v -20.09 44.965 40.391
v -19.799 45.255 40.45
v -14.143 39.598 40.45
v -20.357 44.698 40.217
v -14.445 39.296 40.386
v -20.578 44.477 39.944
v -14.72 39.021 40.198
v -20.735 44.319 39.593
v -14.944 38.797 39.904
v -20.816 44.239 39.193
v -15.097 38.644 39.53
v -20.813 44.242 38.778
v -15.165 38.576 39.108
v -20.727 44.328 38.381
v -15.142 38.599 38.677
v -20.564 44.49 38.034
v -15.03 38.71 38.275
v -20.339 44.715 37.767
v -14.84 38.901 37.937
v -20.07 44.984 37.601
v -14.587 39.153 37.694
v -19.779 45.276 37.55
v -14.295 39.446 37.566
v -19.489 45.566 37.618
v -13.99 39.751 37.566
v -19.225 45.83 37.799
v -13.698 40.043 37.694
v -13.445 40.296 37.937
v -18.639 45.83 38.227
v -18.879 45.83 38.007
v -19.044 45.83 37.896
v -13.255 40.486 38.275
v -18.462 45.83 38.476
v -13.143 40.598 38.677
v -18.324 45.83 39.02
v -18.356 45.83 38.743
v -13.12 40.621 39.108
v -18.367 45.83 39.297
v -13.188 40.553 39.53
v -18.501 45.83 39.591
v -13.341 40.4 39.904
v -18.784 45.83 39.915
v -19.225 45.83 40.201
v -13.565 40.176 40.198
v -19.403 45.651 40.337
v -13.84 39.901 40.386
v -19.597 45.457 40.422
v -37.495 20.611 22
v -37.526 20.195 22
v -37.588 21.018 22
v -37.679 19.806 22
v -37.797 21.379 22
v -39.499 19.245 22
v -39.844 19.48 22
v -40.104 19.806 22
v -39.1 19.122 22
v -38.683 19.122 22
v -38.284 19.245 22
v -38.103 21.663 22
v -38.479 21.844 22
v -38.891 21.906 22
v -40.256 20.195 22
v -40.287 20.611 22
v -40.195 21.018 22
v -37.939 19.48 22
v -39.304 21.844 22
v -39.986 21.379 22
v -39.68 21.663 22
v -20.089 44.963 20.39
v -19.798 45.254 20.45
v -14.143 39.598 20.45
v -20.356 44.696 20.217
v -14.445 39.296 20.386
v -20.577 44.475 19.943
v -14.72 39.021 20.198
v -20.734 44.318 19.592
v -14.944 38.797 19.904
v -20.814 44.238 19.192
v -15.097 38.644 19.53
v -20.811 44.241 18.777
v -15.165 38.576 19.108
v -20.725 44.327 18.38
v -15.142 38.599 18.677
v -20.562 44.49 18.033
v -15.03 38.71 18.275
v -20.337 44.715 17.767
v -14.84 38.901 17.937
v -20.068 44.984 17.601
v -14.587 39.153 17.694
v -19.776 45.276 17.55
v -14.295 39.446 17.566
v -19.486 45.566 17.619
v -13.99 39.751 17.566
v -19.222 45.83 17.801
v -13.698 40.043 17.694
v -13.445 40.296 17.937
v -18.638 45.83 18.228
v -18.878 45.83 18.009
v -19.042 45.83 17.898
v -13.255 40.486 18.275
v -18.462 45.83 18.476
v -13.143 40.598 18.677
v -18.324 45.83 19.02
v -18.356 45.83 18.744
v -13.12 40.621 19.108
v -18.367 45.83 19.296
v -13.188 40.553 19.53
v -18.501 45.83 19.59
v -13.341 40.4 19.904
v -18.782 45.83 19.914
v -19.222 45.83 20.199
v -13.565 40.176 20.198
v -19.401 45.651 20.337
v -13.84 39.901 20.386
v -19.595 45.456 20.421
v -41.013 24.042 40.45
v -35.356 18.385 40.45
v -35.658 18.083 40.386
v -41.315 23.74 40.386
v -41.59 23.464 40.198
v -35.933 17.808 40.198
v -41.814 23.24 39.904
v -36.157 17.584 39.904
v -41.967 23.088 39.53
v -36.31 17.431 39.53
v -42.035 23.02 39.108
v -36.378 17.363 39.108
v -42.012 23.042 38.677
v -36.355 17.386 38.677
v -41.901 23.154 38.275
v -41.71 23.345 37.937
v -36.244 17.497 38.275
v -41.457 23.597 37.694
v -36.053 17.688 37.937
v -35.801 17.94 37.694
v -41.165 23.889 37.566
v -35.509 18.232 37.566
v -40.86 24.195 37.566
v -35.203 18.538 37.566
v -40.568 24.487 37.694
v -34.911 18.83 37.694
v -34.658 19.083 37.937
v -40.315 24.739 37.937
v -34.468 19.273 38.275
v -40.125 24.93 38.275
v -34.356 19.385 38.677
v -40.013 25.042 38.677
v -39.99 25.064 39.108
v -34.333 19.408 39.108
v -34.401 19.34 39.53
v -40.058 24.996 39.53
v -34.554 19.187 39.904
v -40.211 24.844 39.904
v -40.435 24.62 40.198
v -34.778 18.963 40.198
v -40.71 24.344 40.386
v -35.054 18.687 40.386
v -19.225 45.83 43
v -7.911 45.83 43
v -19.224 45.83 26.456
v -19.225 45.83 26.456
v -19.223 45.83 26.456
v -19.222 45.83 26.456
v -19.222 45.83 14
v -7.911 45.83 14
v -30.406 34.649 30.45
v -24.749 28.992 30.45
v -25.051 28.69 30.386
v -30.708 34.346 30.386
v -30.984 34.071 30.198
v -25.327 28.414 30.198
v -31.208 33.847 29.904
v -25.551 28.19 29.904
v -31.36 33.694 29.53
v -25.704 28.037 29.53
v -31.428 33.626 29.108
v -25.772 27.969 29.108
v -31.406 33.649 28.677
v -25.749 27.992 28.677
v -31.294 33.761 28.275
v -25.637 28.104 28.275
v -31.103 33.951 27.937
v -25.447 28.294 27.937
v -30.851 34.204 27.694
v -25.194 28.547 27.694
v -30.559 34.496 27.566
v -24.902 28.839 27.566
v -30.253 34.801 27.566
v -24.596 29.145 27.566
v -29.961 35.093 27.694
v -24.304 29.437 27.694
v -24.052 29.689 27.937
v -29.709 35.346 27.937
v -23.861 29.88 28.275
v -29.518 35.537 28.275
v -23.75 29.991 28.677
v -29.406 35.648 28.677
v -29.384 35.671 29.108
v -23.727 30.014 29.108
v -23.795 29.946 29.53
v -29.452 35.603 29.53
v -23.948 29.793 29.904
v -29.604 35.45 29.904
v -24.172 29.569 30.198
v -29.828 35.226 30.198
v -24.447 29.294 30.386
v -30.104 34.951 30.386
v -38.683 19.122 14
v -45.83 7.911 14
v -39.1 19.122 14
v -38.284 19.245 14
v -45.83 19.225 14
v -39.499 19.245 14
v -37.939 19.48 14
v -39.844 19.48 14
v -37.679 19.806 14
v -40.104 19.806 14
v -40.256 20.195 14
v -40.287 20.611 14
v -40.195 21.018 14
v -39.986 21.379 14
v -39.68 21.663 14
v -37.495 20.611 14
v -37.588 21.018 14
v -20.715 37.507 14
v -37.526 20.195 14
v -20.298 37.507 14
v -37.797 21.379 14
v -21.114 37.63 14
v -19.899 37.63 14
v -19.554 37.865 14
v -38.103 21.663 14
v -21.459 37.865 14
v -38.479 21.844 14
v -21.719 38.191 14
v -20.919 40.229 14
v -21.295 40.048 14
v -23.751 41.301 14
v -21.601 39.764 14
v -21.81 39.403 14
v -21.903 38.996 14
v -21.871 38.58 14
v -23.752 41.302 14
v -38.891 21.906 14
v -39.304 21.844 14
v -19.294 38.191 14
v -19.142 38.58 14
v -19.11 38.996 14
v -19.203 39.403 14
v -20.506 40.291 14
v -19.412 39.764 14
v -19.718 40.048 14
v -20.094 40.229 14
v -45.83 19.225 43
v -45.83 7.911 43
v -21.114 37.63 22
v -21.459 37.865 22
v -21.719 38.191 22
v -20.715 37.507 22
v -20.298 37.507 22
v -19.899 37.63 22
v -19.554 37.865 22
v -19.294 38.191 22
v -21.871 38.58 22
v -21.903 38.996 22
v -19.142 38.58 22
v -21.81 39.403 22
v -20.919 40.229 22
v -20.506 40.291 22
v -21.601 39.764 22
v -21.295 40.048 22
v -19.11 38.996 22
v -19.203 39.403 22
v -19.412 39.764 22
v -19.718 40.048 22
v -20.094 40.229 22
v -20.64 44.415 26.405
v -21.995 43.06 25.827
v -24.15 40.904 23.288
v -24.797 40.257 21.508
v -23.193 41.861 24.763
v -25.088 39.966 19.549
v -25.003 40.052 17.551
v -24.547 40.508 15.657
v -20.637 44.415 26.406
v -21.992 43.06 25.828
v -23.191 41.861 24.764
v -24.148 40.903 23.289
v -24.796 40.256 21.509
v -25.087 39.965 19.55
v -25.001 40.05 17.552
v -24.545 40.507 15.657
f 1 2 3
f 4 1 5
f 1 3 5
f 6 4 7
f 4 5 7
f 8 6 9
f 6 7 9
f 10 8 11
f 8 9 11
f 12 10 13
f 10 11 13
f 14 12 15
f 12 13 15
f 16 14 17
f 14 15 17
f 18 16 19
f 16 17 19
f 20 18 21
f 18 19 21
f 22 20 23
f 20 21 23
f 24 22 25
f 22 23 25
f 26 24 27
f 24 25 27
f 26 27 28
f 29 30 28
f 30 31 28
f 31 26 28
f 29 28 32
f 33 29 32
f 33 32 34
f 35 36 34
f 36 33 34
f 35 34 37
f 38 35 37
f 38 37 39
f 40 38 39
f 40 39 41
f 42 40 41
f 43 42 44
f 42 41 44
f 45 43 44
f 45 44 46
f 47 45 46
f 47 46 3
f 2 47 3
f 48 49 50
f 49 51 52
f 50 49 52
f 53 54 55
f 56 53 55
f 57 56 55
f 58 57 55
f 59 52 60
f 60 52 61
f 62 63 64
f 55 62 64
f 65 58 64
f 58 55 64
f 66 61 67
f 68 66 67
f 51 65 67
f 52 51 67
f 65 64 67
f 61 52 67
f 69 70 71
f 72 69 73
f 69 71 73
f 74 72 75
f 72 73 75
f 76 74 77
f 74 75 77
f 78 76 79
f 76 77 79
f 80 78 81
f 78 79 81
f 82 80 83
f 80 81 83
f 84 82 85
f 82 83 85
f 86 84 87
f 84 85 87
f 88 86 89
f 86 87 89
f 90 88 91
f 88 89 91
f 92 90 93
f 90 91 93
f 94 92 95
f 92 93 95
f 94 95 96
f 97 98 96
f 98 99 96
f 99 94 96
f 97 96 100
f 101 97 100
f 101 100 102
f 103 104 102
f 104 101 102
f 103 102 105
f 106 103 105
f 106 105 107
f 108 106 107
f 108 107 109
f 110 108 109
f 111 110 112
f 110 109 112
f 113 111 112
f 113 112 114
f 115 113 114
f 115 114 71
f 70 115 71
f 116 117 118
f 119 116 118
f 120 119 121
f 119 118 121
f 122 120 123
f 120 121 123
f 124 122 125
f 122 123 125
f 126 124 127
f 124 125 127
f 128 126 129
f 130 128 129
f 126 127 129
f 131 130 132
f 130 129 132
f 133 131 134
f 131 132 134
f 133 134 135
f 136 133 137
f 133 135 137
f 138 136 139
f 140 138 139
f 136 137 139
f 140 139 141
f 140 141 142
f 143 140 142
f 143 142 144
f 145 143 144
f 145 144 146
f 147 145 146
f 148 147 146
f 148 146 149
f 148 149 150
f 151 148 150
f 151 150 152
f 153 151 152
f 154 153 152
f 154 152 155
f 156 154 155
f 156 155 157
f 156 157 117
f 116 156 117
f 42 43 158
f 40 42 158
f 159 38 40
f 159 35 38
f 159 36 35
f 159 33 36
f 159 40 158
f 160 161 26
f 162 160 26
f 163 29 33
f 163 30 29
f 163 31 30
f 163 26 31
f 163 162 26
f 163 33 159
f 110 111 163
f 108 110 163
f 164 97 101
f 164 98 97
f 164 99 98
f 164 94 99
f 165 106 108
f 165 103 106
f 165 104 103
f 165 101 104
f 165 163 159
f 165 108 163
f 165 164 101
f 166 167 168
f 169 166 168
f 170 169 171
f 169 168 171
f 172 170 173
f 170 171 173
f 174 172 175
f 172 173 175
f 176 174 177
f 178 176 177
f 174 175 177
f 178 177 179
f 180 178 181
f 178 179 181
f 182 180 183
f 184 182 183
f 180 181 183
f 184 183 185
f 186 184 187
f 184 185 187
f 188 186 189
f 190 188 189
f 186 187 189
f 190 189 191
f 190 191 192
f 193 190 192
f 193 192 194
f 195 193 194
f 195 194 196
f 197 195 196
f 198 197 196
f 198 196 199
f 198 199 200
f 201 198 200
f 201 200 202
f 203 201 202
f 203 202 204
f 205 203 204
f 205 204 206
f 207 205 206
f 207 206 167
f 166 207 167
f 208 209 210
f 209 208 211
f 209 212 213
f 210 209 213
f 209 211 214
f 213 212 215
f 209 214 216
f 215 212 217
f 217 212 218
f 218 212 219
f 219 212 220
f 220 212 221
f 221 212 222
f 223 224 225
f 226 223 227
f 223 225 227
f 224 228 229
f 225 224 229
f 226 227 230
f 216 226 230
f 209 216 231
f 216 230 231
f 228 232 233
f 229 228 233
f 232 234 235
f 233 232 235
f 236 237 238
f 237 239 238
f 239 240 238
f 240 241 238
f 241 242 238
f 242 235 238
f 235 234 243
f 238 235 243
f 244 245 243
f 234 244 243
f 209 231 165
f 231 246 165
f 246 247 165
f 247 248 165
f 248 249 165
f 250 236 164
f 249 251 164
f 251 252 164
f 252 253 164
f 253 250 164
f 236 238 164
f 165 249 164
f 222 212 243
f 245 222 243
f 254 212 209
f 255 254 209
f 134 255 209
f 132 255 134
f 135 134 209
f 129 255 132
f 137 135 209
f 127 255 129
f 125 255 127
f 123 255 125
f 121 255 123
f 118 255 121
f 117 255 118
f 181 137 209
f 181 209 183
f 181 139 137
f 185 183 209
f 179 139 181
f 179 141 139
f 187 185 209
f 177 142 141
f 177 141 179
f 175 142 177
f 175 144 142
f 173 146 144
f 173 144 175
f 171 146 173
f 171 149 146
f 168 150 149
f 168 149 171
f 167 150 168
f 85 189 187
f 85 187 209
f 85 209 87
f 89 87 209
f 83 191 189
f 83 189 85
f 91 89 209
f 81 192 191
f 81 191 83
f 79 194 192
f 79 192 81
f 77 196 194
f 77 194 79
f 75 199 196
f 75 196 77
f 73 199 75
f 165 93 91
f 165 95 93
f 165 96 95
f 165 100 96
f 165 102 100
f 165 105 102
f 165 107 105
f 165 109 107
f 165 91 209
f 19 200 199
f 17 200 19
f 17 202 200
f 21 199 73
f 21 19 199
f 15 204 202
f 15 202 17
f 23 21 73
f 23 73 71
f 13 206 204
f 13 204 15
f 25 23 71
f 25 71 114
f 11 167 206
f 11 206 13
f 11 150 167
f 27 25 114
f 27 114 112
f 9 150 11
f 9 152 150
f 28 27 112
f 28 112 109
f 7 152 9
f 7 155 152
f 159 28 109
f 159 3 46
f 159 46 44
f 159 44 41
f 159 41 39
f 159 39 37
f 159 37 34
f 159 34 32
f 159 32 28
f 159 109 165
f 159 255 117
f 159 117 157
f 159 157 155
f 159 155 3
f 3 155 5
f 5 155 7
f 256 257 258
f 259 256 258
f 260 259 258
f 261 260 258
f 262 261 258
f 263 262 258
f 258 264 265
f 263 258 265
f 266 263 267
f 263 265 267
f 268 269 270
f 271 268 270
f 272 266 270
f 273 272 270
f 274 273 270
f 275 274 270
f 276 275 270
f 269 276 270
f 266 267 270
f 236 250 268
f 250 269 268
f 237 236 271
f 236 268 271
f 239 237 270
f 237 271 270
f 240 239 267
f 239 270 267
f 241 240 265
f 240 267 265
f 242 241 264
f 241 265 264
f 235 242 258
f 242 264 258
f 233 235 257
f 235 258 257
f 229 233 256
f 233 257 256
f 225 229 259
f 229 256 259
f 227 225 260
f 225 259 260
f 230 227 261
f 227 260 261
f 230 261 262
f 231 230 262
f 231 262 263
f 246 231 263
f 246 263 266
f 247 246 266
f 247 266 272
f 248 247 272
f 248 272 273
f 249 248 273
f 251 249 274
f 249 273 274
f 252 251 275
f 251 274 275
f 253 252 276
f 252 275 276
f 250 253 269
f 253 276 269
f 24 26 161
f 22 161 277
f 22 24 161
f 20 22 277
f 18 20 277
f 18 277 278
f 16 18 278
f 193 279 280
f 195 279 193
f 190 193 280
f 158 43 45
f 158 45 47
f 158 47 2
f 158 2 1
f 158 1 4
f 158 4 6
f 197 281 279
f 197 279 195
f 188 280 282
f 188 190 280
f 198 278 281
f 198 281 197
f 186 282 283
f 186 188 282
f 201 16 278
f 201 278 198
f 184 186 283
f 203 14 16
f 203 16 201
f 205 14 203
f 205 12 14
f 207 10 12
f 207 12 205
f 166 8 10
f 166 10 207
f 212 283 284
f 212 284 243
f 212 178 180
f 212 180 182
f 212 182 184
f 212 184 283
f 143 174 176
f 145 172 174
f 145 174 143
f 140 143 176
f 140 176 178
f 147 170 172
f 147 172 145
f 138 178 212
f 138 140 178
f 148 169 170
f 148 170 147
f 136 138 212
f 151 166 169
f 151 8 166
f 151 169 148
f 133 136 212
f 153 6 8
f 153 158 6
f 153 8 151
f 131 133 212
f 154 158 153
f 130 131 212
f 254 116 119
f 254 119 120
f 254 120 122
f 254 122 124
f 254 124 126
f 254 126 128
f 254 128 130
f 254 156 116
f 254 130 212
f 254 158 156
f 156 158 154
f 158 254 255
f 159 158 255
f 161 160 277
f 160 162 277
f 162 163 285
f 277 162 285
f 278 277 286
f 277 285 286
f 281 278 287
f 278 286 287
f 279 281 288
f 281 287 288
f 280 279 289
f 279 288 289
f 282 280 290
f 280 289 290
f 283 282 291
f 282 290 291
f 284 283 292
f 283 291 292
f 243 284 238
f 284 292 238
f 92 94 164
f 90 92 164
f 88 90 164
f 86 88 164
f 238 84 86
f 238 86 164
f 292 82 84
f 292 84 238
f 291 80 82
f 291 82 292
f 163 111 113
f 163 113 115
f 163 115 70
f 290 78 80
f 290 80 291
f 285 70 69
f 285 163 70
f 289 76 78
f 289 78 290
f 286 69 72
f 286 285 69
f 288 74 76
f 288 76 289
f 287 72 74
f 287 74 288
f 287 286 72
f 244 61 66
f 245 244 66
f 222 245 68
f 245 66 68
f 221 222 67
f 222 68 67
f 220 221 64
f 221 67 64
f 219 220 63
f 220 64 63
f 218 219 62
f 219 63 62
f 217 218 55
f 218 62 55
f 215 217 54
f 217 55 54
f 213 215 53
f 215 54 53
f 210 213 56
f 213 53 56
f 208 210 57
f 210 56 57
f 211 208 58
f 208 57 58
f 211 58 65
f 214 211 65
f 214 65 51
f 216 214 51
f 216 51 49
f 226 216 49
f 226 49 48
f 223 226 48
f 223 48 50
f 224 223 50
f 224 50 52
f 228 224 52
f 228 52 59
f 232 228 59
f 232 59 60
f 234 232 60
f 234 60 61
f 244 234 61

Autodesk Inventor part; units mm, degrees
ref_plane "YZ Plane" through (0, 0, 0) normal (1, 0, 0) x (0, 1, 0)
ref_plane "XZ Plane" through (0, 0, 0) normal (0, 1, 0) x (-1, 0, 0)
ref_plane "Work Plane1" through (0, 0, 10) normal (0, 0, 1) x (1, 0, 0)
sketch "Sketch1" plane through (0, 0, 10) normal (0, 0, 1) x (1, 0, 0)
  line L0 (-4.0299, -0.3538) -> (-2.2322, 1.4439) construction
  arc A0 (-1.4439, 2.2322) -> (-2.2322, 1.4439) centre (-0.9299, 0.9299) ccw construction
  line L1 (-1.4439, 2.2322) -> (0.3538, 4.0299) construction
  line L2 (-37.8299, 42.8299) -> (-37.8299, 37.8299) construction
  line L3 (-37.8299, 37.8299) -> (-42.9208, 37.8299) construction
  line L4 (-37.8299, 42.2137) -> (-37.8299, 45.8299) construction
  line L5 (-37.8299, 45.8299) -> (-4.0299, 45.8299) construction
  line L6 (-4.0299, 45.8299) -> (-4.0299, 42.2137) construction
  line L7 (-4.0299, 4.0299) -> (0.3538, 4.0299) projected
  circle A1 centre (-20.9299, 20.9299) radius 17.5 projected
  line L8 (-20.9299, 58.9723) -> (17.1124, 20.9299) construction
  line L9 (17.1124, 20.9299) -> (-20.9299, -17.1124) construction
  line L10 (-20.9299, -17.1124) -> (-58.9723, 20.9299) construction
  line L11 (-58.9723, 20.9299) -> (-20.9299, 58.9723) construction
  line L12 (-20.9299, 58.9723) -> (-20.9299, -17.1124) construction
  line L13 (17.1124, 20.9299) -> (-58.9723, 20.9299) construction
  line L14 (-20.9299, 58.9723) -> (32.8701, 58.9723) construction
  line L15 (-43.4299, 43.4299) -> (1.5701, 43.4299) construction
  line L16 (1.5701, 43.4299) -> (1.5701, -1.5701) construction
  line L17 (1.5701, -1.5701) -> (-43.4299, -1.5701) construction
  line L18 (-43.4299, -1.5701) -> (-43.4299, 43.4299) construction
  line L19 (-43.4299, 43.4299) -> (1.5701, -1.5701) construction
  line L20 (1.5701, 43.4299) -> (-43.4299, -1.5701) construction
  line L21 (-43.4299, 5.3876) -> (-43.4299, 36.4723)
  line L22 (-43.4299, 36.4723) -> (-36.4723, 43.4299)
  line L23 (-36.4723, 43.4299) -> (-5.3876, 43.4299)
  line L24 (-5.3876, 43.4299) -> (1.5701, 36.4723)
  line L25 (1.5701, 36.4723) -> (1.5701, 5.3876)
  line L26 (1.5701, 5.3876) -> (-5.3876, -1.5701)
  line L27 (-5.3876, -1.5701) -> (-36.4723, -1.5701)
  line L28 (-36.4723, -1.5701) -> (-43.4299, 5.3876)
  line L29 (-4.0299, 42.2137) -> (-37.8299, 42.2137) projected
  line L30 (-4.0299, -0.3538) -> (-4.0299, 4.0299) projected
  circle A2 centre (-20.9299, 20.9299) radius 1.4
  line L31 (-10.9299, 10.9299) -> (-30.9299, 10.9299) construction
  line L32 (-30.9299, 10.9299) -> (-30.9299, 30.9299) construction
  line L33 (-30.9299, 30.9299) -> (-10.9299, 30.9299) construction
  line L34 (-10.9299, 30.9299) -> (-10.9299, 10.9299) construction
  line L35 (-10.9299, 10.9299) -> (-30.9299, 30.9299) construction
  line L36 (-30.9299, 10.9299) -> (-10.9299, 30.9299) construction
  circle A3 centre (-30.9299, 30.9299) radius 1.4
  circle A4 centre (-30.9299, 10.9299) radius 1.4
  circle A5 centre (-10.9299, 10.9299) radius 1.4
  line L37 (-45.8299, 37.8299) -> (-42.0723, 37.8299) construction
  line L38 (-42.1723, 37.7299) -> (-45.8299, 37.7299)
  line L39 (-45.8299, 37.7299) -> (-45.8299, 4.1299)
  line L40 (-45.8299, 4.1299) -> (-42.1723, 4.1299)
  line L41 (-42.1723, 4.1299) -> (-42.1723, 37.7299)
  line L42 (-45.8299, 4.0299) -> (-42.0723, 4.0299) construction
  line L43 (-45.8299, 37.8299) -> (-42.0723, 37.8299) projected
  line L44 (-37.7299, 45.8299) -> (-4.1299, 45.8299)
  line L45 (-4.1299, 45.8299) -> (-4.1299, 42.1723)
  line L46 (-4.1299, 42.1723) -> (-37.7299, 42.1723)
  line L47 (-37.7299, 42.1723) -> (-37.7299, 45.8299)
  line L48 (0.4701, 37.8299) -> (0.4701, 4.0299) construction
  line L49 (0.4701, 4.0299) -> (3.9701, 4.0299) construction
  line L50 (3.9701, 37.8299) -> (3.9701, 4.0299) construction
  line L51 (0.4701, 37.8299) -> (3.9701, 37.8299) construction
  line L52 (-45.8299, -3.9701) -> (-4.0299, -3.9701) construction
  line L53 (0.3124, 37.7299) -> (3.9701, 37.7299)
  line L54 (3.9701, 37.7299) -> (3.9701, 4.1299)
  line L55 (3.9701, 4.1299) -> (0.3124, 4.1299)
  line L56 (0.3124, 4.1299) -> (0.3124, 37.7299)
  line L57 (-4.1713, -0.3538) -> (-37.7299, -0.3538)
  line L58 (-37.7299, -0.3538) -> (-37.7299, -3.9701)
  line L59 (-37.7299, -3.9701) -> (-4.1713, -3.9701)
  line L60 (-4.1713, -3.9701) -> (-4.1713, -0.3538)
  point P0 (-37.8299, 4.0299)
  dimension "d18" = 53.8
  dimension "d19" = 45
  dimension "d20" = 53.8
  dimension "d21" = 45
  dimension "d22" = 45
  dimension "d30" = 20
  dimension "d31" = 20
  dimension "d32" = 2.8
  dimension "d33" = 2.8
  dimension "d34" = 2.8
  dimension "d35" = 2.8
  dimension "d36" = 0.1
  dimension "d37" = 0.1
  dimension "d38" = 0.1
  dimension "d39" = 0.1
extrude "Extrusion1" add sketch "Sketch1" along normal blind 5 contours L30 L26 L57 L28 L41 L22 L46 L24 L56 L7 | L7 L26 L30 | L56 L24 L25 L26 | L26 L25 L24 L53 L54 L55 | L60 L59 L58 L57 L28 L27 L26 | L26 L27 L28 L57 | L46 L22 L29 L24 | L24 L29 L45 | L40 L39 L38 L22 L21 L28 | L28 L21 L22 L41 | L29 L22 L23 L24 | L24 L23 L22 L29 L47 L44 L45 | L47 L29 L22 | A1 | A2 | A3 | A4 | A5
sketch "Sketch4" plane through (0, 0, 15) normal (0, 0, 1) x (1, 0, 0)
  line L0 (-37.7299, 42.1723) -> (-42.1723, 37.7299) projected
  line L1 (-42.1723, 37.7299) -> (-45.8299, 37.7299) projected
  line L2 (-45.8299, 37.7299) -> (-45.8299, 4.1299) projected
  line L3 (-45.8299, 4.1299) -> (-42.1723, 4.1299) projected
  line L4 (-42.1723, 4.1299) -> (-37.6885, -0.3538) projected
  line L5 (-37.6885, -0.3538) -> (-37.7299, -0.3538) projected
  line L6 (-37.7299, -0.3538) -> (-37.7299, -3.9701) projected
  line L7 (-37.7299, -3.9701) -> (-4.1713, -3.9701) projected
  line L8 (-4.1713, -3.9701) -> (-4.1713, -0.3538) projected
  line L9 (-4.1713, -0.3538) -> (0.3124, 4.1299) projected
  line L10 (0.3124, 4.1299) -> (3.9701, 4.1299) projected
  line L11 (3.9701, 4.1299) -> (3.9701, 37.7299) projected
  line L12 (3.9701, 37.7299) -> (0.3124, 37.7299) projected
  line L13 (0.3124, 37.7299) -> (-4.1299, 42.1723) projected
  line L14 (-4.1299, 42.1723) -> (-4.1299, 45.8299) projected
  line L15 (-4.1299, 45.8299) -> (-37.7299, 45.8299) projected
  line L16 (-37.7299, 45.8299) -> (-37.7299, 42.1723) projected
  line L17 (-45.8299, 37.7299) -> (-45.8299, 4.1299) projected
  line L18 (-45.8299, 7.911) -> (-7.911, 45.8299)
  line L19 (-45.8299, 7.911) -> (7.7955, 7.911) construction
  line L20 (-7.911, 45.8299) -> (-19.2247, 45.8299)
  line L21 (-4.1299, 45.8299) -> (-37.7299, 45.8299) projected
  line L22 (-19.2247, 45.8299) -> (-45.8299, 19.2247)
  line L23 (-45.8299, 7.911) -> (-45.8299, 19.2247)
  circle A0 centre (-40.9299, 0.9299) radius 1.1933 projected
  circle A1 centre (-0.9299, 40.9299) radius 1.4 projected
  line L24 (-40.9299, 0.9299) -> (-0.9299, 40.9299)
  line L25 (0.3124, 37.7299) -> (-4.1299, 42.1723) projected
  point P0 (0, 0)
  dimension "d40" = 45
  dimension "d41" = 8
extrude "Extrusion4" add sketch "Sketch4" along normal blind 28 contours L15 L18 L2 L22
sketch "Sketch5" plane through (-45.8299, 19.2247, 15) normal (-0.7071068, 0.7071068, 0) x (-0.7071068, -0.7071068, 0)
  line L0 (0, 0) -> (-37.6254, 0) projected
  line L1 (0, 0) -> (0, 28) projected
  line L2 (-37.6254, 28) -> (0, 28) projected
  line L3 (-37.6254, 0) -> (-37.6254, 28) projected
  circle A0 centre (-18.8127, 9.1873) radius 18.8127
  line L4 (-6.8127, 24) -> (-36.8127, 24) construction
  line L5 (-36.8127, 24) -> (-36.8127, 4) construction
  line L6 (-36.8127, 4) -> (-6.8127, 4) construction
  line L7 (-6.8127, 4) -> (-6.8127, 24) construction
  line L8 (-6.8127, 24) -> (-36.8127, 4) construction
  line L9 (-36.8127, 24) -> (-6.8127, 4) construction
  point P0 (-18.8127, -15)
  point P1 (-21.8127, 14)
  dimension "d44" = 30
  dimension "d45" = 20
hole "Hole1" at (-19.7994, 45.2552, 39) at (-19.7994, 45.2552, 19) at (-41.0126, 24.042, 39) at (-30.406, 34.6486, 29) direction (0.7071068, -0.7071068, 0) diameter 2.9 depth 12
sketch "Sketch6" plane through (-37.7299, -3.9701, 10) normal (0, -1, 0) x (1, 0, 0)
  circle A0 centre (-3.2, 36.9) radius 1.45 projected
  circle A1 centre (36.8, 36.9) radius 1.45 projected
  line L0 (-6.1, 0) -> (-6.1, 39.8) projected
  line L1 (-0.1, 0) -> (-6.1, 0) projected
  line L2 (-0.1, 33.8) -> (-0.1, 0) projected
  line L3 (33.7, 33.8) -> (-0.1, 33.8) projected
  line L4 (33.7, 33.8) -> (33.7, 0) projected
  line L5 (39.7, 0) -> (33.7, 0) projected
  line L6 (39.7, 39.8) -> (39.7, 0) projected
  line L7 (-6.1, 39.8) -> (39.7, 39.8) projected
  circle A2 centre (16.8, 16.9) radius 16.9
  circle A3 centre (16.8, 16.9) radius 14.9
  line L8 (-0.1, 16.9) -> (-0.1, 0)
  line L9 (0, 0) -> (33.5586, 0) projected
  line L10 (0.0414, 0) -> (-4.4423, 0) projected
  line L11 (33.5586, 0) -> (0.0414, 0)
  line L12 (33.7, 16.9) -> (33.5586, 0)
  point P0 (37.7299, -10)
  dimension "d53" = 2
extrude "Extrusion5" cut sketch "Sketch6" against normal up to surface contours A3 surface through (-45.8299, 7.911, 15) normal (0.7071068, -0.7071068, 0)
ref_plane "Work Plane3" through (3.9701, 45.8299, 26) normal (1, 0, 0) x (0, -1, 0)
sketch "Sketch7" plane through (3.9701, 45.8299, 26) normal (1, 0, 0) x (0, -1, 0)
  line L0 (41.8, -17.8) -> (41.8, 16) projected
  line L1 (8, -17.8) -> (41.8, -17.8) projected
  line L2 (8, -17.8) -> (8, 16) projected
  circle A0 centre (24.9, -0.9) radius 16.9
  circle A1 centre (24.9, -0.9) radius 14.9
  point P0 (45.8299, 26)
  dimension "d56" = 2
ref_plane "Work Plane4" through (-34.8055, 8.3289, 16.6138) normal (0.7071068, -0.7071068, 0) x (0.7071068, 0.7071068, 0)
extrude "Extrusion6" cut sketch "Sketch7" against normal up to surface contours A1 surface through (-45.8299, 7.911, 15) normal (0.7071068, -0.7071068, 0)
sketch "Sketch8" plane through (-45.8299, 19.2247, 15) normal (-0.7071068, 0.7071068, 0) x (-0.7071068, -0.7071068, 0)
  arc A0 (-37.6254, 2.7992) -> (-37.6254, 5.2008) centre (-36.8127, 4) ccw projected
  circle A1 centre (-36.8127, 4) radius 7.5
  point P0 (-18.8127, -15)
  dimension "d59" = 15
extrude "Extrusion7" cut sketch "Sketch8" along normal blind 10
sketch "Sketch9" plane through (0, 0, 10) normal (0, 0, -1) x (-1, 0, 0)
  line L0 (45.8299, 19.2247) -> (24.2855, 40.7692) projected
  line L1 (41.7776, 11.9633) -> (26.8705, 26.8705) projected
  line L2 (26.8705, 26.8705) -> (11.9633, 41.7776) projected
  line L3 (19.2247, 45.8299) -> (24.2855, 40.7692) projected
  line L4 (7.911, 45.8299) -> (11.9633, 41.7776) projected
  line L5 (41.7776, 11.9633) -> (45.8299, 7.911) projected
  line L6 (15.1679, 38.5731) -> (20.8247, 44.2299) projected
  line L7 (13.1172, 40.6237) -> (18.3235, 45.8299) projected
  line L8 (34.3304, 19.4105) -> (39.9873, 25.0673) projected
  line L9 (36.3811, 17.3599) -> (42.0379, 23.0167) projected
  circle A0 centre (20.5065, 38.8913) radius 1.4
  line L10 (25.7745, 27.9665) -> (31.4313, 33.6233) projected
  line L11 (31.4313, 33.6233) -> (25.7745, 27.9665)
  line L12 (26.8705, 26.8705) -> (32.5273, 32.5273)
  circle A1 centre (38.8913, 20.5065) radius 1.4
  point P0 (0, 0)
  point P1 (34.7528, 24.7491)
  dimension "d62" = 2.8
hole "Hole2" at (-20.5065, 38.8913, 10) at (-38.8913, 20.5065, 10) direction (0, 0, 1) diameter 2.8 depth 12 counterbore diameter 5.5 counterbore depth 3
sketch "Sketch11" plane through (0, 0, 43) normal (0, 0, 1) x (1, 0, 0)
  line L0 (-7.911, 45.8299) -> (-19.2247, 45.8299) projected
  line L1 (-19.2247, 45.8299) -> (-45.8299, 19.2247) projected
  line L2 (-45.8299, 19.2247) -> (-45.8299, 7.911) projected
  line L3 (-45.8299, 7.911) -> (-7.911, 45.8299) projected
  line L4 (-45.8299, 37.7299) -> (-45.8299, 19.2247) projected
  line L5 (-42.1723, 37.7299) -> (-45.8299, 37.7299) projected
  line L6 (-37.7299, 42.1723) -> (-42.1723, 37.7299) projected
  line L7 (-37.7299, 45.8299) -> (-37.7299, 42.1723) projected
  line L8 (-29.3463, 45.8299) -> (-37.7299, 45.8299) projected
  line L9 (-29.3463, 45.8299) -> (-19.2247, 45.8299) projected
  line L10 (-4.1299, 45.8299) -> (-7.911, 45.8299) projected
  line L11 (-4.1299, 42.1723) -> (-4.1299, 45.8299) projected
  line L12 (0.3124, 37.7299) -> (-4.1299, 42.1723) projected
  line L13 (3.9701, 37.7299) -> (0.3124, 37.7299) projected
  line L14 (3.9701, 29.8965) -> (3.9701, 11.9633) projected
  line L15 (3.9701, 29.8965) -> (3.9701, 37.7299) projected
  line L16 (-11.9633, -3.9701) -> (-4.1713, -3.9701) projected
  line L17 (-4.1713, -3.9701) -> (-4.1713, -0.3538) projected
  line L18 (-4.1713, -0.3538) -> (0.3124, 4.1299) projected
  line L19 (0.3124, 4.1299) -> (3.9701, 4.1299) projected
  line L20 (3.9701, 4.1299) -> (3.9701, 11.9633) projected
  line L21 (-11.9633, -3.9701) -> (-29.8965, -3.9701) projected
  line L22 (-37.7299, -3.9701) -> (-29.8965, -3.9701) projected
  line L23 (-37.7299, -0.3538) -> (-37.7299, -3.9701) projected
  line L24 (-45.8299, 7.911) -> (-7.911, 45.8299) projected
  line L25 (-45.8299, 7.911) -> (-7.911, 45.8299)
  line L26 (-45.8299, 7.911) -> (-45.8299, 4.1299) projected
  line L27 (-45.8299, 4.1299) -> (-42.1723, 4.1299) projected
  line L28 (-37.6885, -0.3538) -> (-37.7299, -0.3538) projected
  line L29 (-42.1723, 4.1299) -> (-37.6885, -0.3538) projected
  point P0 (0, 0)
extrude "Extrusion8" cut sketch "Sketch11" against normal through all contours L10 L11 L12 L13 L15 L14 L20 L19 L18 L17 L16 L21 L22 L23 L28 L29 L27 L26 L3 | L1 L4 L5 L6 L7 L8 L9
sketch "Sketch12" plane through (-45.8299, 19.2247, 10) normal (-0.7071068, 0.7071068, 0) x (-0.7071068, -0.7071068, 0)
  line L0 (-45.6254, 33) -> (-45.6254, 0) projected
  line L1 (8, 0) -> (8, 33) projected
  line L2 (-45.6254, 0) -> (8, 0)
  line L3 (8, 0) -> (8, 4)
  line L4 (8, 4) -> (-45.6254, 4)
  line L5 (-45.6254, 4) -> (-45.6254, 0)
  point P0 (-18.8127, -10)
  point P1 (45.6254, -4)
  point P2 (45.6254, -5)
  point P3 (-8, -5)
  point P4 (-8, -4)
  dimension "d73" = 4
extrude "Extrusion9" cut sketch "Sketch12" against normal blind 29
properties part number "20_Cube_Insert_Kinematic_Mirrormount_45_base_part2"
